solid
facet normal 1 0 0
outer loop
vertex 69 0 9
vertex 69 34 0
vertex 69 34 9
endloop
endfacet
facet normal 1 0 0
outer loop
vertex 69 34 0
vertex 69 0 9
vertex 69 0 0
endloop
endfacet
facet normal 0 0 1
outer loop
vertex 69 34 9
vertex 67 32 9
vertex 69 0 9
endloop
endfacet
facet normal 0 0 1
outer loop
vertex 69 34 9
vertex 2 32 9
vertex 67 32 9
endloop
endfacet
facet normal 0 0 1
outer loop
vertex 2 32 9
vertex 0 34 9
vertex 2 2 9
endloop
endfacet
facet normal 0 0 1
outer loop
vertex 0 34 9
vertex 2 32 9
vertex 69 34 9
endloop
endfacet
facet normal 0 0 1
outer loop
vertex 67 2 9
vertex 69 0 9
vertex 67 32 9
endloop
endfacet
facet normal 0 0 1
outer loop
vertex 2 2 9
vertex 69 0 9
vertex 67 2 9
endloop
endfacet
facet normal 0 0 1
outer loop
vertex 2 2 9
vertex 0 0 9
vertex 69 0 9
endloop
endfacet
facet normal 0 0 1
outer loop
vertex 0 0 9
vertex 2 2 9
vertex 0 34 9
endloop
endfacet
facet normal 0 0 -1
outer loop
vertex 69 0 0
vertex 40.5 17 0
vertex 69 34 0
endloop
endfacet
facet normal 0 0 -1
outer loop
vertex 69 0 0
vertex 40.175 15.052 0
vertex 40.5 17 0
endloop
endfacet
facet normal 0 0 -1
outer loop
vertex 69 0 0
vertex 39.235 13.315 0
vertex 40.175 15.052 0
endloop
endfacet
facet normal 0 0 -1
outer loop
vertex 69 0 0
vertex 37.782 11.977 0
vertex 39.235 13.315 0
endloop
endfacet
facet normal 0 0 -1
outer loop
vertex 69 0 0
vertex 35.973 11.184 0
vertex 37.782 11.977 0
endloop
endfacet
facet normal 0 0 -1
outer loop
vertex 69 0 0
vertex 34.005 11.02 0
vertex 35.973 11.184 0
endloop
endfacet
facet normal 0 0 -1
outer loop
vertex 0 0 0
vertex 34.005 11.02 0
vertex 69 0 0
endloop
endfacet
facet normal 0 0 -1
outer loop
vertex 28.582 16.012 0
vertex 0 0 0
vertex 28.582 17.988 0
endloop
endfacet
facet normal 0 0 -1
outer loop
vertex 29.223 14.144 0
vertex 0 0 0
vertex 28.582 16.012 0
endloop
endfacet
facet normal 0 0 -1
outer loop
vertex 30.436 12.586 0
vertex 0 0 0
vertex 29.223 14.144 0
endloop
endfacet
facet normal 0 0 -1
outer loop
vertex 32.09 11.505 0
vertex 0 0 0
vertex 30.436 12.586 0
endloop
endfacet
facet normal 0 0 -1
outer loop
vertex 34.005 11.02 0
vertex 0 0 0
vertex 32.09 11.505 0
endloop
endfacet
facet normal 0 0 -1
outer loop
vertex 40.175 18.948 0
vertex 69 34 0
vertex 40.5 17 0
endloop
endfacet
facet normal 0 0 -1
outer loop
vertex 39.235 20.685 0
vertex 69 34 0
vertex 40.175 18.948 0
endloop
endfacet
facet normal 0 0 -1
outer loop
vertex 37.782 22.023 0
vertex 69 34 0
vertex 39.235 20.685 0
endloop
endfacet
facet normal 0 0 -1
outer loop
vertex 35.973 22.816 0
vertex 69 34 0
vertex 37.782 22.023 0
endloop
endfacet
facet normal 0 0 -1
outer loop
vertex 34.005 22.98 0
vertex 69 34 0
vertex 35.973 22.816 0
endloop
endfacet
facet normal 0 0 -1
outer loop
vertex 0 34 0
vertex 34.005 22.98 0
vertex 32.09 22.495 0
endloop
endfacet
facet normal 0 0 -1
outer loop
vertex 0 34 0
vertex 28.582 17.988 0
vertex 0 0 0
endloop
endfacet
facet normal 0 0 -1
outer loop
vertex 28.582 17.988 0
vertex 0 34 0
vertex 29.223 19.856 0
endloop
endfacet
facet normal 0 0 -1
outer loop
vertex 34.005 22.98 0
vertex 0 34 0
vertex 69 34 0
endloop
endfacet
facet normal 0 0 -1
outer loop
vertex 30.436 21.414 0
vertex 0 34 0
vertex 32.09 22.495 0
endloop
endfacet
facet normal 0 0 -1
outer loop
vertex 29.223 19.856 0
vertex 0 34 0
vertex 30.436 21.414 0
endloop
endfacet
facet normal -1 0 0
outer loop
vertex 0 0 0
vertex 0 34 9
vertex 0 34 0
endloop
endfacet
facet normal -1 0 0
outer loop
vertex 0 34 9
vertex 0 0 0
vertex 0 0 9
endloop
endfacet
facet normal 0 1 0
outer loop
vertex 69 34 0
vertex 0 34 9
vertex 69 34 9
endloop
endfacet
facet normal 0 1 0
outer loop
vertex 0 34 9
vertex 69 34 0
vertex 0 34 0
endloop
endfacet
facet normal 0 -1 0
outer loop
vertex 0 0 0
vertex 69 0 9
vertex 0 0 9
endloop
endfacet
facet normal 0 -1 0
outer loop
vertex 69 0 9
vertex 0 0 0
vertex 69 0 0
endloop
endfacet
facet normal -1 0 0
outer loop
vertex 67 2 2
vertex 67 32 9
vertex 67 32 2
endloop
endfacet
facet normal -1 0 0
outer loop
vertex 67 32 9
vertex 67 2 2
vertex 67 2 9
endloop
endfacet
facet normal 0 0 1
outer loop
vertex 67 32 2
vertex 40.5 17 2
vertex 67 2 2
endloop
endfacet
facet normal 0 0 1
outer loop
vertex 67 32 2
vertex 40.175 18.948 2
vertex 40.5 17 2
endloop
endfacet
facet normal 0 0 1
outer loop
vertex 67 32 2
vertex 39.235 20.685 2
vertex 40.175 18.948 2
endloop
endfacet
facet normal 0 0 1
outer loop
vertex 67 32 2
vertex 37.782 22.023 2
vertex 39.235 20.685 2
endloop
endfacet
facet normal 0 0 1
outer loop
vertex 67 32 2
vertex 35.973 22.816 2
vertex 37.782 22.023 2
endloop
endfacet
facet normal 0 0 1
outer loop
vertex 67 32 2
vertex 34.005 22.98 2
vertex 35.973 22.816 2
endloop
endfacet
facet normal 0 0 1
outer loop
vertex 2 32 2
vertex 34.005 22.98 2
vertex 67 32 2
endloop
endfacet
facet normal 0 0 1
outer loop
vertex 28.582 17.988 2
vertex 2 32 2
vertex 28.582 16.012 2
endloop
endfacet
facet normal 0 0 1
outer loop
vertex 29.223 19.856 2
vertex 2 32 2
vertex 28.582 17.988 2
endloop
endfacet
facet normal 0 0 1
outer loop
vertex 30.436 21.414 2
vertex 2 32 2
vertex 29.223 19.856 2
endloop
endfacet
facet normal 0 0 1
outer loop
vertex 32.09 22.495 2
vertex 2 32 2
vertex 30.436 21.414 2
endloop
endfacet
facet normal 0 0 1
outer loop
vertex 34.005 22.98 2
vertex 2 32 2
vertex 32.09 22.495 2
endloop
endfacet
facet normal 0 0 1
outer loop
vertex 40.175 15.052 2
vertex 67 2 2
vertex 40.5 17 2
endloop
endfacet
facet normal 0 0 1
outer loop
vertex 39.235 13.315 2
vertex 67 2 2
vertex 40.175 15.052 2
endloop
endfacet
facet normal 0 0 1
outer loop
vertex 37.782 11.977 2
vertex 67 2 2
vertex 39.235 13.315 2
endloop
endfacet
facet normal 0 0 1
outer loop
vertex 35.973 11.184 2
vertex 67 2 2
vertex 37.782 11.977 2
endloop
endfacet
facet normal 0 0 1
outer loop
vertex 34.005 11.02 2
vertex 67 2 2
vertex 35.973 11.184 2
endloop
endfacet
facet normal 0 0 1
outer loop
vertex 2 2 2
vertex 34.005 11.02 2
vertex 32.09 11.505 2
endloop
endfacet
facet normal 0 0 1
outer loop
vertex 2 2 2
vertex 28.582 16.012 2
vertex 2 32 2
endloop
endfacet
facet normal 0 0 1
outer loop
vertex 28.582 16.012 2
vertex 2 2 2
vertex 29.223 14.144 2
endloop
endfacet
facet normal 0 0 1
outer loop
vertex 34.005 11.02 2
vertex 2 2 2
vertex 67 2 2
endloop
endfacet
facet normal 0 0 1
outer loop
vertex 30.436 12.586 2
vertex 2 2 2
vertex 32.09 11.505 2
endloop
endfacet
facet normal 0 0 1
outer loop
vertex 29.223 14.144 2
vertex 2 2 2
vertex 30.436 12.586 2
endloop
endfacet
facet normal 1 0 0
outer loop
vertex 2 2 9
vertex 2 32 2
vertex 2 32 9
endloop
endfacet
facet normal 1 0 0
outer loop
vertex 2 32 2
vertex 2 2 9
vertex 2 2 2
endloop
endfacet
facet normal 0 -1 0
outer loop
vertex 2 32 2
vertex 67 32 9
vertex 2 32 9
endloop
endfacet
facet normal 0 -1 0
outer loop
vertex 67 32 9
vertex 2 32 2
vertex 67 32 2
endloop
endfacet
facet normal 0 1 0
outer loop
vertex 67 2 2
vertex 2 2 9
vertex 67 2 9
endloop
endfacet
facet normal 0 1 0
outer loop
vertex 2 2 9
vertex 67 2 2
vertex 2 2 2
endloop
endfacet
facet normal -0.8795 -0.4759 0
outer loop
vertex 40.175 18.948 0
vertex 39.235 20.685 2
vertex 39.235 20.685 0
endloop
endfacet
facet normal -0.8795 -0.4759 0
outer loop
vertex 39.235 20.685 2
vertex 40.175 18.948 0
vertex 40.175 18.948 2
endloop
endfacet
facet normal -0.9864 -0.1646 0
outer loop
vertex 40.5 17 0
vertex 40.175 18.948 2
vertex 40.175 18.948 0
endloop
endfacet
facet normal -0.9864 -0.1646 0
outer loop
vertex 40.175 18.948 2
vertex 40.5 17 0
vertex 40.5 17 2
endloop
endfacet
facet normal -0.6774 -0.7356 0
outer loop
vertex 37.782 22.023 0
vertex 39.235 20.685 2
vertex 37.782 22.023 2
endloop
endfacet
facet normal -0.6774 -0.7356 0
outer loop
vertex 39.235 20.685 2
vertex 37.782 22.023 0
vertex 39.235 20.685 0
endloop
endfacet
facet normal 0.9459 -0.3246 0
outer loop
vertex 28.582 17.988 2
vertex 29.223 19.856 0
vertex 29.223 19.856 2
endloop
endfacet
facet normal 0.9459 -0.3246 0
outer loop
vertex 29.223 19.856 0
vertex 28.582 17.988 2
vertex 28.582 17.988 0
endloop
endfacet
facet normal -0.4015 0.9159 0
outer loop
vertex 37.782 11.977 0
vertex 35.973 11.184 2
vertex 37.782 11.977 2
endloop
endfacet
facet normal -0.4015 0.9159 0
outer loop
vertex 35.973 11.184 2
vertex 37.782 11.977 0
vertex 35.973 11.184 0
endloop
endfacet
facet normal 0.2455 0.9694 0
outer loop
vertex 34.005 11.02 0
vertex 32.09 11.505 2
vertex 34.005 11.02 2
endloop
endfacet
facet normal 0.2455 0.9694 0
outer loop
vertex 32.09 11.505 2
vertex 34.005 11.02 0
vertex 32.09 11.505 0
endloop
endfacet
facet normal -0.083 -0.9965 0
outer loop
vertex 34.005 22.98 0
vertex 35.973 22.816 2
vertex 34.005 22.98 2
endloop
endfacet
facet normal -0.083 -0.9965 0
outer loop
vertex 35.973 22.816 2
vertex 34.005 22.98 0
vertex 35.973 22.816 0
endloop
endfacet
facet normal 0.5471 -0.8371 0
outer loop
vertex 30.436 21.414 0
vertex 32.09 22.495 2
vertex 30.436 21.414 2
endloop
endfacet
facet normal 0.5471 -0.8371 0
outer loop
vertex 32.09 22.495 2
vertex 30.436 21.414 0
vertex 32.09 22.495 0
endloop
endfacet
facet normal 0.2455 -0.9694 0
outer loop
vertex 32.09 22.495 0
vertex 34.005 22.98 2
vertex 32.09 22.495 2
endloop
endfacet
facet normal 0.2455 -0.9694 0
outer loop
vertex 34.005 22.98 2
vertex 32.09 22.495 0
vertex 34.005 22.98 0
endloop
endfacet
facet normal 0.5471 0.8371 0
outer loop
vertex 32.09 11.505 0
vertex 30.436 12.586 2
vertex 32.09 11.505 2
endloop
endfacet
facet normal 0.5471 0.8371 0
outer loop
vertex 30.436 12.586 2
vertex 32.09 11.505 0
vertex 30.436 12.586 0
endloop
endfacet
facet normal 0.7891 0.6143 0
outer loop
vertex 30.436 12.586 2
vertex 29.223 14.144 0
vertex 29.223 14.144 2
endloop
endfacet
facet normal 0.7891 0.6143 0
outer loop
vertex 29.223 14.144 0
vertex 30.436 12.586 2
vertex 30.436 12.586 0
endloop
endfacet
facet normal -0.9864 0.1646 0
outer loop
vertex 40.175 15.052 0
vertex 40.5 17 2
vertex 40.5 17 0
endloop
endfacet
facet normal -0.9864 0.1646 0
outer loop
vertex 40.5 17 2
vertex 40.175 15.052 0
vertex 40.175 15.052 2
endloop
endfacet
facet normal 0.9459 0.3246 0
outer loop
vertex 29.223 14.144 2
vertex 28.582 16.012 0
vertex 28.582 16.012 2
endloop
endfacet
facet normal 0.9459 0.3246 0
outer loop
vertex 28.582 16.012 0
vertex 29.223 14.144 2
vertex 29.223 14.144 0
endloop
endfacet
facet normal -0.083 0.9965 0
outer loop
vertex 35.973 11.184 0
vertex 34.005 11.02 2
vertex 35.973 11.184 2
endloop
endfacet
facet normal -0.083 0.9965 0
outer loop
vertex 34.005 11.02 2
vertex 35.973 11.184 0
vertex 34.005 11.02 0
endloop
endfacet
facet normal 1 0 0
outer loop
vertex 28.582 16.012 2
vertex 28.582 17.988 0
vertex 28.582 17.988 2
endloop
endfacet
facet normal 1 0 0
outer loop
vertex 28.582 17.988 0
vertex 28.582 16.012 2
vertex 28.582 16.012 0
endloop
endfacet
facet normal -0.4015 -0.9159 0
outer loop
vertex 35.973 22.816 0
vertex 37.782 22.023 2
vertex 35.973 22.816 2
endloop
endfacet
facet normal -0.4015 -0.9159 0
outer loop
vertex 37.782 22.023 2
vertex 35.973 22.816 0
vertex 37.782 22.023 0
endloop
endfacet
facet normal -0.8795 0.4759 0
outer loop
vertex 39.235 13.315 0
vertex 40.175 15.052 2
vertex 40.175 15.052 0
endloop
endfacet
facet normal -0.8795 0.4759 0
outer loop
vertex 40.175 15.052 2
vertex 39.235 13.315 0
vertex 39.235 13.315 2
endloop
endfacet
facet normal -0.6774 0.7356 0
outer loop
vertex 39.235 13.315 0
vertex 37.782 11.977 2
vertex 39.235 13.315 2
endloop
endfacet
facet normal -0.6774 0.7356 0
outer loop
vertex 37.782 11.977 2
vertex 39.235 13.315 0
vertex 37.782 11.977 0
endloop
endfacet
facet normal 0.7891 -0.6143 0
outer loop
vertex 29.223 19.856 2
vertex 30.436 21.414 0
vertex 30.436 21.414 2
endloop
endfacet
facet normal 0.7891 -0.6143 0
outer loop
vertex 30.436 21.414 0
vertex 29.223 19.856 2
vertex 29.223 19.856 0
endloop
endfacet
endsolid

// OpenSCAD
// Raspberry Pi Zero dimensions [mm]:
l = 65;
w = 30;
h = 7;

d = 2; // wall thickness
r = 6; // hole radius
difference() {
  cube([l + 2 * d, w + 2 * d, h + d]);
  translate([d, d, d]) {
      cube([l, w, h]);
  }
  translate([(l / 2) + d, (w / 2) + d], 0) {
      cylinder(d, r, r, false);
  }
}
